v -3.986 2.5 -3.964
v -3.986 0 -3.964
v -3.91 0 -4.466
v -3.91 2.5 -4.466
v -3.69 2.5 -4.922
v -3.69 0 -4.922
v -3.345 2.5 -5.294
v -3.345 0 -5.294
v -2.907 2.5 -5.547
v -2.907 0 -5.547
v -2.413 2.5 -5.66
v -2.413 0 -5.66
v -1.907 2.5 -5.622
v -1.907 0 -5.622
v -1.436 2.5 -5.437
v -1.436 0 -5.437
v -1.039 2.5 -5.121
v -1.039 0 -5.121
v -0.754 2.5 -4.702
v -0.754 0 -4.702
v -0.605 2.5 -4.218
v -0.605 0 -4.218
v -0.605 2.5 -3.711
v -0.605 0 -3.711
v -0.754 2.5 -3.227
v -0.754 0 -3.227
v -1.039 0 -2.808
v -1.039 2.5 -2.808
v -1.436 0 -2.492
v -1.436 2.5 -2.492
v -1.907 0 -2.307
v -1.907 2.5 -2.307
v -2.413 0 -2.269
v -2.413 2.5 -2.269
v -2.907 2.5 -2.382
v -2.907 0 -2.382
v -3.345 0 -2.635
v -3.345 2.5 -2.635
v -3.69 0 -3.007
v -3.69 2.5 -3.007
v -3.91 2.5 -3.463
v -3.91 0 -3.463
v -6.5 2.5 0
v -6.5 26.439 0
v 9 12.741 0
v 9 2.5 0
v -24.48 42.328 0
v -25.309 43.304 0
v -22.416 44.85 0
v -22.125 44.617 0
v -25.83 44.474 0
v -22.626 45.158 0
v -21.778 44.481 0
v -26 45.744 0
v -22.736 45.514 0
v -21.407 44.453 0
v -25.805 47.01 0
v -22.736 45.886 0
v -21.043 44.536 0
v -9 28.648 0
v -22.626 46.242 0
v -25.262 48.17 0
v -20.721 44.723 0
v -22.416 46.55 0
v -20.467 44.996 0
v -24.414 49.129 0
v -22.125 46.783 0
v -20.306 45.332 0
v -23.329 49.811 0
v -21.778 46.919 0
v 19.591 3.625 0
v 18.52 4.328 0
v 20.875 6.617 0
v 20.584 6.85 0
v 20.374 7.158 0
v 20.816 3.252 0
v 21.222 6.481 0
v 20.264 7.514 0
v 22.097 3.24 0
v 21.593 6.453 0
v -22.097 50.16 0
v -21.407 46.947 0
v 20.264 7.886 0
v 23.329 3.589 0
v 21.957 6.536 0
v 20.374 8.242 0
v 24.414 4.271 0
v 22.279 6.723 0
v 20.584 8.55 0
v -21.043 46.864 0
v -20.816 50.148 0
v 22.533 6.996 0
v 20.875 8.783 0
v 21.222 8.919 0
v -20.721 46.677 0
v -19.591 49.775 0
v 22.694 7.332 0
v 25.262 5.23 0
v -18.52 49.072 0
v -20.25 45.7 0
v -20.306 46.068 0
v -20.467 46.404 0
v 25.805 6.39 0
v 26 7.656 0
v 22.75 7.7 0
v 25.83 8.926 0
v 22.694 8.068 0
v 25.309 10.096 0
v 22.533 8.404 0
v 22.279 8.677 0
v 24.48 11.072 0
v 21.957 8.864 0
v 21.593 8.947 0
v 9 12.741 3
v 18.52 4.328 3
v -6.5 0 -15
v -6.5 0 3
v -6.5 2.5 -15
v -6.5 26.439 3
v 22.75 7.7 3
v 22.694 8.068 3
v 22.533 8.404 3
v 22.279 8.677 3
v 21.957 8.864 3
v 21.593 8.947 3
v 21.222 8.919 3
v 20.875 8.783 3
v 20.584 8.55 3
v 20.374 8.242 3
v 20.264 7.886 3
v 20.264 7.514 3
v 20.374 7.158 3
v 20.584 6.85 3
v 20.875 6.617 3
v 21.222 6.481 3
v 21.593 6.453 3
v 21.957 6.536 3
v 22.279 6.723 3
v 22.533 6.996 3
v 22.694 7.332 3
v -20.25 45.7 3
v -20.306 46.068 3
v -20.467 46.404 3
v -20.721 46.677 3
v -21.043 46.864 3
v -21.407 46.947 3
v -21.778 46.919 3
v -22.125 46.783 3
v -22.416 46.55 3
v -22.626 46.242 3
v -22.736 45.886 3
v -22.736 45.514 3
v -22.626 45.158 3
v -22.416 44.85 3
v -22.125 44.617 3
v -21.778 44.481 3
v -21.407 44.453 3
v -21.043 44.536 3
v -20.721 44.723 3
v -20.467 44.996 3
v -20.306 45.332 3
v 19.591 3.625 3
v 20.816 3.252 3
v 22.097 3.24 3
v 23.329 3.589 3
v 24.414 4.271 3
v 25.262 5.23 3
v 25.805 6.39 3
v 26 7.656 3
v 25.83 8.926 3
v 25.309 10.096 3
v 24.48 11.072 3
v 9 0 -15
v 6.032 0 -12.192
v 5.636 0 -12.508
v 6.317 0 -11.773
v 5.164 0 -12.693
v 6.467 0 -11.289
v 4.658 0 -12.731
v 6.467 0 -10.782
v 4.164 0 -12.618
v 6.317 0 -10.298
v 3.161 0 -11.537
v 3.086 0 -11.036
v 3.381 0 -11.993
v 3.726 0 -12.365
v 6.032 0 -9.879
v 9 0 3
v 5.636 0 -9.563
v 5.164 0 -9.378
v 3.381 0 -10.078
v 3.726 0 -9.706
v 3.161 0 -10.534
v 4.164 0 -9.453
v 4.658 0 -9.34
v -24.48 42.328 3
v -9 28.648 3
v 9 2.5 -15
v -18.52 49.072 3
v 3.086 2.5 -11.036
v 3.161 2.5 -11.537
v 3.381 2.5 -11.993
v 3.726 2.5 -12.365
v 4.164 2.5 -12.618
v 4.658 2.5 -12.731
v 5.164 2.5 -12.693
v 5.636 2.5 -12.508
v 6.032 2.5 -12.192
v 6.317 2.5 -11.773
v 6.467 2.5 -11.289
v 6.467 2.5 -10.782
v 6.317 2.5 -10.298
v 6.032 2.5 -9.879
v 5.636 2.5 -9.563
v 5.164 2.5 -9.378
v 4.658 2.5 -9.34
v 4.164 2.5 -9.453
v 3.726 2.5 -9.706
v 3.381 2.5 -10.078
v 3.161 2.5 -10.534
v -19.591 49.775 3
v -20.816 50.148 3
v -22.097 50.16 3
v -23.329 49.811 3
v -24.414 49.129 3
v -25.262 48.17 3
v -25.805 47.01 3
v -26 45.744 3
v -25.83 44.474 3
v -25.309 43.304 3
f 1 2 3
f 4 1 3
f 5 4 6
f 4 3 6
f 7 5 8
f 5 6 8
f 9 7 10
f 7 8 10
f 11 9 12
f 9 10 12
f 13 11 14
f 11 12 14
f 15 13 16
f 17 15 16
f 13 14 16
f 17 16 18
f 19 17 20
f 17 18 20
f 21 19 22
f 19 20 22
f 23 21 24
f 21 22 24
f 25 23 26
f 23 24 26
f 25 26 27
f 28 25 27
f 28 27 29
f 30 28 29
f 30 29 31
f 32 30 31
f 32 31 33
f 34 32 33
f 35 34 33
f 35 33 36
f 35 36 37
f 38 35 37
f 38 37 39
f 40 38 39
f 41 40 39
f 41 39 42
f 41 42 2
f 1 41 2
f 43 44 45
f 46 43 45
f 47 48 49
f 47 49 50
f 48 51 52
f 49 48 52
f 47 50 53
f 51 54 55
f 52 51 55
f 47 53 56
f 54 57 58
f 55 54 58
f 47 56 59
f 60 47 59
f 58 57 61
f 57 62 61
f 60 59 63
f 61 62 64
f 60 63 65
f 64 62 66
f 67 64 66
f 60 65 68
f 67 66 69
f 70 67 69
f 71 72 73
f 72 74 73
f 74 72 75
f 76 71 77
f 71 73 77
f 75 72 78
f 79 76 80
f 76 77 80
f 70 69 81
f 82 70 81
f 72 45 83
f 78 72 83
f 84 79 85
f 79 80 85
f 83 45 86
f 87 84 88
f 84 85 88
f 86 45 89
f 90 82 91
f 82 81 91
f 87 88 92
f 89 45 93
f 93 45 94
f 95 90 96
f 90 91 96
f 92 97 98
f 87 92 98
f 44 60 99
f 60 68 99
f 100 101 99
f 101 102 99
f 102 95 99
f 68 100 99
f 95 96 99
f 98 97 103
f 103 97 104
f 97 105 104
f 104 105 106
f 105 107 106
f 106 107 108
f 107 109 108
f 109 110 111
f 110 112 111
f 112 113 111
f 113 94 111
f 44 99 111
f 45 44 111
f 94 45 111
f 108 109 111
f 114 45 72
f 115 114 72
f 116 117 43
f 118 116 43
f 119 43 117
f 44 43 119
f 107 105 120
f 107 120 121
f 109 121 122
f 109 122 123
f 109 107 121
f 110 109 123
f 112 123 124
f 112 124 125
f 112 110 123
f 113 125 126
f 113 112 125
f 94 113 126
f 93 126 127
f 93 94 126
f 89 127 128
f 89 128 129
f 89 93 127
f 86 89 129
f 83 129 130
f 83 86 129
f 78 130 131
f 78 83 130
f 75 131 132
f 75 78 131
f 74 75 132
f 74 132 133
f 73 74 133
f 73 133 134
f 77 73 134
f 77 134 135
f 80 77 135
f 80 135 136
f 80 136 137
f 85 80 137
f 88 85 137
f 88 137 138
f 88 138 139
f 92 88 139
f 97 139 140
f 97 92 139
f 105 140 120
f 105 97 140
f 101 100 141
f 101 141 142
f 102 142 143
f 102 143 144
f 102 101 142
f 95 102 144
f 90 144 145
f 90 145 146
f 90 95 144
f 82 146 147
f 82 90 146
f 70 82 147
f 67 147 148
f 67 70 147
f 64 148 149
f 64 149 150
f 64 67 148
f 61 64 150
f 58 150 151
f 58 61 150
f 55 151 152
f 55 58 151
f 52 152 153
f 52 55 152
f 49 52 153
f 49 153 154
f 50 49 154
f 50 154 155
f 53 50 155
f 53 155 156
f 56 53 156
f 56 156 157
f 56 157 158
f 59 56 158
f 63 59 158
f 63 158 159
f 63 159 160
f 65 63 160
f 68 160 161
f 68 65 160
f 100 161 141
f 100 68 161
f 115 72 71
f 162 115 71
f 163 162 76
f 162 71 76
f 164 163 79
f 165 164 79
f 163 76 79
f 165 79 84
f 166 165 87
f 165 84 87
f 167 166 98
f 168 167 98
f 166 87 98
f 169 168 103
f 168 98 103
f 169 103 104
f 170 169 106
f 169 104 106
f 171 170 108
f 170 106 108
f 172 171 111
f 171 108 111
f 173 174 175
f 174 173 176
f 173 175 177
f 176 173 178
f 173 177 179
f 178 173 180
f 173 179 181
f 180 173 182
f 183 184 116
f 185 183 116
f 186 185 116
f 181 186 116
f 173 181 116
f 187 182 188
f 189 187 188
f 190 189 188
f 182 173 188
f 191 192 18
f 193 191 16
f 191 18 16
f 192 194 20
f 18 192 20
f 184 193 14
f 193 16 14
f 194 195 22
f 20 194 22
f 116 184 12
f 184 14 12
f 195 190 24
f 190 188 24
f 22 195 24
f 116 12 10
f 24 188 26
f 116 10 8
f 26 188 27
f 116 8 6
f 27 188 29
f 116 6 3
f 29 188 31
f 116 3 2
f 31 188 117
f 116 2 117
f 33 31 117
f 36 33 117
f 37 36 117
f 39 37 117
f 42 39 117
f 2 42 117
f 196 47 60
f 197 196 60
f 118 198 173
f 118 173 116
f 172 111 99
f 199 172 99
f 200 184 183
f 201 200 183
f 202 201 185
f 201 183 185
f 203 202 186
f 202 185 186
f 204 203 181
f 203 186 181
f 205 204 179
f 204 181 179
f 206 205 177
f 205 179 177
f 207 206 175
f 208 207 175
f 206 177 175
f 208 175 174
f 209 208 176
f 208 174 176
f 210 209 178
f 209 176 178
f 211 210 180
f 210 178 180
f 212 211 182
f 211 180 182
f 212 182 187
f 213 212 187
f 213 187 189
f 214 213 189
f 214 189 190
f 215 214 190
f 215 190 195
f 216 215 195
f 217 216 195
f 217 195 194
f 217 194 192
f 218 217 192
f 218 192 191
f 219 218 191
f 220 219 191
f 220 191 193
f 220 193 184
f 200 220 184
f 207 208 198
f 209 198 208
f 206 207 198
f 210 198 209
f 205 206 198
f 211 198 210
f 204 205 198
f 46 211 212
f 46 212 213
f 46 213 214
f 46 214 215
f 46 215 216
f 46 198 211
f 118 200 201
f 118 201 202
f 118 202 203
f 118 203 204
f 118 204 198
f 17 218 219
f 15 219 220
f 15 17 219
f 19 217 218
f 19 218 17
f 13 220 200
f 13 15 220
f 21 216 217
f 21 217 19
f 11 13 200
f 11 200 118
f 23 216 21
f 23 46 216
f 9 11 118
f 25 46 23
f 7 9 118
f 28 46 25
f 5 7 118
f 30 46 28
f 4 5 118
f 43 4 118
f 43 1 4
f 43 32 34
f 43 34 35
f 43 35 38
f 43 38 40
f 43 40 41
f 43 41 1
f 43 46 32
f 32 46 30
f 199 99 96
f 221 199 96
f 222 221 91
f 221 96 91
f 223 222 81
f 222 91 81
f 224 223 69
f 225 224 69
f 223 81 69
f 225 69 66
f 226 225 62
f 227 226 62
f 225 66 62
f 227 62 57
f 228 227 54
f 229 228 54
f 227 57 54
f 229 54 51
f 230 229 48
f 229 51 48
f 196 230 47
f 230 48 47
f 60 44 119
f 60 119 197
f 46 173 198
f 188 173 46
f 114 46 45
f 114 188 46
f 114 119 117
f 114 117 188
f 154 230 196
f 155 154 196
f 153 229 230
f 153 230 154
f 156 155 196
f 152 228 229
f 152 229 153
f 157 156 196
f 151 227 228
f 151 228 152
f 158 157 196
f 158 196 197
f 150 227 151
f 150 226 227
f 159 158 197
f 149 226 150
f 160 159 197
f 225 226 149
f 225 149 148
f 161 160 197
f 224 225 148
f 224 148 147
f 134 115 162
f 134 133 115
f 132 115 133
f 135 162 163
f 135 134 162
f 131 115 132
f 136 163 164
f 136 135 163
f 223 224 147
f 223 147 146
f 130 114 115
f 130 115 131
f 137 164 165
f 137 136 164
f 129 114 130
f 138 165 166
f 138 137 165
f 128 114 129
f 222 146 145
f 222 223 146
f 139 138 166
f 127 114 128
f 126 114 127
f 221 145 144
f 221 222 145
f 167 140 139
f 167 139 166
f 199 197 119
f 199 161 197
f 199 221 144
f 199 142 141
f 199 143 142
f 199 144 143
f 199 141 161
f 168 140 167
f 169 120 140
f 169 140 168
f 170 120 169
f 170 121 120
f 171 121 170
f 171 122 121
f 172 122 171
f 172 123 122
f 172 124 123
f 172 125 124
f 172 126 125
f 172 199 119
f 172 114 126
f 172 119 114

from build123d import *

# Parameters (mm, degrees)
SKETCH1_R            = 1.25
BOSS_EXTRUDE1_DEPTH  = 3
SKETCH2_W            = 18
SKETCH2_H            = 2.5
BOSS_EXTRUDE2_DEPTH  = 15
MOVE_START           = -15
MOVE_FACE1_DEPTH     = 18
M3_CLEARANCE_HOLE1_D = 3.4


# Read off the part's stored shape, not the designer's step: Move Face1
with BuildPart() as part:
    # Sketch1 → Boss-Extrude1 (new body)
    with BuildSketch(Plane.XY):
        with BuildLine():
            Line((24.479890084, 11.071980885), (-18.520109916, 49.071980885))
            ThreePointArc((-18.520109916, 49.071980885), (-24.871980885, 48.679890084), (-24.479890084, 42.328019115))
            Line((-24.479890084, 42.328019115), (-9, 28.64811625))
            Line((-9, 28.64811625), (-9, 0))
            Line((-9, 0), (9, 0))
            Line((9, 0), (9, 12.741139506))
            Line((9, 12.741139506), (18.520109916, 4.328019115))
            ThreePointArc((18.520109916, 4.328019115), (24.871980885, 4.720109916), (24.479890084, 11.071980885))
        make_face()
        with Locations((21.5, 7.7)):
            Circle(SKETCH1_R, mode=Mode.SUBTRACT)
        with Locations((-21.5, 45.7)):
            Circle(SKETCH1_R, mode=Mode.SUBTRACT)
    extrude(amount=BOSS_EXTRUDE1_DEPTH)

    # Sketch2 → Boss-Extrude2 (add)
    with BuildSketch(Plane(origin=(0, 0, 0), x_dir=(-1, 0, 0), z_dir=(0, 0, -1))):
        with Locations((0, 1.25)):
            Rectangle(SKETCH2_W, SKETCH2_H)
    extrude(amount=BOSS_EXTRUDE2_DEPTH)

    # Move Face1 outline → Move Face1 (cut)
    with BuildSketch(Plane.XY.offset(MOVE_START)):
        Polygon((-6.5, 26.438813925), (-9, 28.64811625), (-9, 0), (-6.5, 0), align=None)
    extrude(amount=MOVE_FACE1_DEPTH, mode=Mode.SUBTRACT)

    # M3 Clearance Hole1 (through all)
    with Locations(Plane(origin=(0, 2.5, 0), x_dir=(1, 0, 0), z_dir=(0, 1, 0))):
        with Locations((-2.285533906, 3.964466094), (4.785533906, 11.035533906)):
            Hole(M3_CLEARANCE_HOLE1_D / 2)


solid = part.part
